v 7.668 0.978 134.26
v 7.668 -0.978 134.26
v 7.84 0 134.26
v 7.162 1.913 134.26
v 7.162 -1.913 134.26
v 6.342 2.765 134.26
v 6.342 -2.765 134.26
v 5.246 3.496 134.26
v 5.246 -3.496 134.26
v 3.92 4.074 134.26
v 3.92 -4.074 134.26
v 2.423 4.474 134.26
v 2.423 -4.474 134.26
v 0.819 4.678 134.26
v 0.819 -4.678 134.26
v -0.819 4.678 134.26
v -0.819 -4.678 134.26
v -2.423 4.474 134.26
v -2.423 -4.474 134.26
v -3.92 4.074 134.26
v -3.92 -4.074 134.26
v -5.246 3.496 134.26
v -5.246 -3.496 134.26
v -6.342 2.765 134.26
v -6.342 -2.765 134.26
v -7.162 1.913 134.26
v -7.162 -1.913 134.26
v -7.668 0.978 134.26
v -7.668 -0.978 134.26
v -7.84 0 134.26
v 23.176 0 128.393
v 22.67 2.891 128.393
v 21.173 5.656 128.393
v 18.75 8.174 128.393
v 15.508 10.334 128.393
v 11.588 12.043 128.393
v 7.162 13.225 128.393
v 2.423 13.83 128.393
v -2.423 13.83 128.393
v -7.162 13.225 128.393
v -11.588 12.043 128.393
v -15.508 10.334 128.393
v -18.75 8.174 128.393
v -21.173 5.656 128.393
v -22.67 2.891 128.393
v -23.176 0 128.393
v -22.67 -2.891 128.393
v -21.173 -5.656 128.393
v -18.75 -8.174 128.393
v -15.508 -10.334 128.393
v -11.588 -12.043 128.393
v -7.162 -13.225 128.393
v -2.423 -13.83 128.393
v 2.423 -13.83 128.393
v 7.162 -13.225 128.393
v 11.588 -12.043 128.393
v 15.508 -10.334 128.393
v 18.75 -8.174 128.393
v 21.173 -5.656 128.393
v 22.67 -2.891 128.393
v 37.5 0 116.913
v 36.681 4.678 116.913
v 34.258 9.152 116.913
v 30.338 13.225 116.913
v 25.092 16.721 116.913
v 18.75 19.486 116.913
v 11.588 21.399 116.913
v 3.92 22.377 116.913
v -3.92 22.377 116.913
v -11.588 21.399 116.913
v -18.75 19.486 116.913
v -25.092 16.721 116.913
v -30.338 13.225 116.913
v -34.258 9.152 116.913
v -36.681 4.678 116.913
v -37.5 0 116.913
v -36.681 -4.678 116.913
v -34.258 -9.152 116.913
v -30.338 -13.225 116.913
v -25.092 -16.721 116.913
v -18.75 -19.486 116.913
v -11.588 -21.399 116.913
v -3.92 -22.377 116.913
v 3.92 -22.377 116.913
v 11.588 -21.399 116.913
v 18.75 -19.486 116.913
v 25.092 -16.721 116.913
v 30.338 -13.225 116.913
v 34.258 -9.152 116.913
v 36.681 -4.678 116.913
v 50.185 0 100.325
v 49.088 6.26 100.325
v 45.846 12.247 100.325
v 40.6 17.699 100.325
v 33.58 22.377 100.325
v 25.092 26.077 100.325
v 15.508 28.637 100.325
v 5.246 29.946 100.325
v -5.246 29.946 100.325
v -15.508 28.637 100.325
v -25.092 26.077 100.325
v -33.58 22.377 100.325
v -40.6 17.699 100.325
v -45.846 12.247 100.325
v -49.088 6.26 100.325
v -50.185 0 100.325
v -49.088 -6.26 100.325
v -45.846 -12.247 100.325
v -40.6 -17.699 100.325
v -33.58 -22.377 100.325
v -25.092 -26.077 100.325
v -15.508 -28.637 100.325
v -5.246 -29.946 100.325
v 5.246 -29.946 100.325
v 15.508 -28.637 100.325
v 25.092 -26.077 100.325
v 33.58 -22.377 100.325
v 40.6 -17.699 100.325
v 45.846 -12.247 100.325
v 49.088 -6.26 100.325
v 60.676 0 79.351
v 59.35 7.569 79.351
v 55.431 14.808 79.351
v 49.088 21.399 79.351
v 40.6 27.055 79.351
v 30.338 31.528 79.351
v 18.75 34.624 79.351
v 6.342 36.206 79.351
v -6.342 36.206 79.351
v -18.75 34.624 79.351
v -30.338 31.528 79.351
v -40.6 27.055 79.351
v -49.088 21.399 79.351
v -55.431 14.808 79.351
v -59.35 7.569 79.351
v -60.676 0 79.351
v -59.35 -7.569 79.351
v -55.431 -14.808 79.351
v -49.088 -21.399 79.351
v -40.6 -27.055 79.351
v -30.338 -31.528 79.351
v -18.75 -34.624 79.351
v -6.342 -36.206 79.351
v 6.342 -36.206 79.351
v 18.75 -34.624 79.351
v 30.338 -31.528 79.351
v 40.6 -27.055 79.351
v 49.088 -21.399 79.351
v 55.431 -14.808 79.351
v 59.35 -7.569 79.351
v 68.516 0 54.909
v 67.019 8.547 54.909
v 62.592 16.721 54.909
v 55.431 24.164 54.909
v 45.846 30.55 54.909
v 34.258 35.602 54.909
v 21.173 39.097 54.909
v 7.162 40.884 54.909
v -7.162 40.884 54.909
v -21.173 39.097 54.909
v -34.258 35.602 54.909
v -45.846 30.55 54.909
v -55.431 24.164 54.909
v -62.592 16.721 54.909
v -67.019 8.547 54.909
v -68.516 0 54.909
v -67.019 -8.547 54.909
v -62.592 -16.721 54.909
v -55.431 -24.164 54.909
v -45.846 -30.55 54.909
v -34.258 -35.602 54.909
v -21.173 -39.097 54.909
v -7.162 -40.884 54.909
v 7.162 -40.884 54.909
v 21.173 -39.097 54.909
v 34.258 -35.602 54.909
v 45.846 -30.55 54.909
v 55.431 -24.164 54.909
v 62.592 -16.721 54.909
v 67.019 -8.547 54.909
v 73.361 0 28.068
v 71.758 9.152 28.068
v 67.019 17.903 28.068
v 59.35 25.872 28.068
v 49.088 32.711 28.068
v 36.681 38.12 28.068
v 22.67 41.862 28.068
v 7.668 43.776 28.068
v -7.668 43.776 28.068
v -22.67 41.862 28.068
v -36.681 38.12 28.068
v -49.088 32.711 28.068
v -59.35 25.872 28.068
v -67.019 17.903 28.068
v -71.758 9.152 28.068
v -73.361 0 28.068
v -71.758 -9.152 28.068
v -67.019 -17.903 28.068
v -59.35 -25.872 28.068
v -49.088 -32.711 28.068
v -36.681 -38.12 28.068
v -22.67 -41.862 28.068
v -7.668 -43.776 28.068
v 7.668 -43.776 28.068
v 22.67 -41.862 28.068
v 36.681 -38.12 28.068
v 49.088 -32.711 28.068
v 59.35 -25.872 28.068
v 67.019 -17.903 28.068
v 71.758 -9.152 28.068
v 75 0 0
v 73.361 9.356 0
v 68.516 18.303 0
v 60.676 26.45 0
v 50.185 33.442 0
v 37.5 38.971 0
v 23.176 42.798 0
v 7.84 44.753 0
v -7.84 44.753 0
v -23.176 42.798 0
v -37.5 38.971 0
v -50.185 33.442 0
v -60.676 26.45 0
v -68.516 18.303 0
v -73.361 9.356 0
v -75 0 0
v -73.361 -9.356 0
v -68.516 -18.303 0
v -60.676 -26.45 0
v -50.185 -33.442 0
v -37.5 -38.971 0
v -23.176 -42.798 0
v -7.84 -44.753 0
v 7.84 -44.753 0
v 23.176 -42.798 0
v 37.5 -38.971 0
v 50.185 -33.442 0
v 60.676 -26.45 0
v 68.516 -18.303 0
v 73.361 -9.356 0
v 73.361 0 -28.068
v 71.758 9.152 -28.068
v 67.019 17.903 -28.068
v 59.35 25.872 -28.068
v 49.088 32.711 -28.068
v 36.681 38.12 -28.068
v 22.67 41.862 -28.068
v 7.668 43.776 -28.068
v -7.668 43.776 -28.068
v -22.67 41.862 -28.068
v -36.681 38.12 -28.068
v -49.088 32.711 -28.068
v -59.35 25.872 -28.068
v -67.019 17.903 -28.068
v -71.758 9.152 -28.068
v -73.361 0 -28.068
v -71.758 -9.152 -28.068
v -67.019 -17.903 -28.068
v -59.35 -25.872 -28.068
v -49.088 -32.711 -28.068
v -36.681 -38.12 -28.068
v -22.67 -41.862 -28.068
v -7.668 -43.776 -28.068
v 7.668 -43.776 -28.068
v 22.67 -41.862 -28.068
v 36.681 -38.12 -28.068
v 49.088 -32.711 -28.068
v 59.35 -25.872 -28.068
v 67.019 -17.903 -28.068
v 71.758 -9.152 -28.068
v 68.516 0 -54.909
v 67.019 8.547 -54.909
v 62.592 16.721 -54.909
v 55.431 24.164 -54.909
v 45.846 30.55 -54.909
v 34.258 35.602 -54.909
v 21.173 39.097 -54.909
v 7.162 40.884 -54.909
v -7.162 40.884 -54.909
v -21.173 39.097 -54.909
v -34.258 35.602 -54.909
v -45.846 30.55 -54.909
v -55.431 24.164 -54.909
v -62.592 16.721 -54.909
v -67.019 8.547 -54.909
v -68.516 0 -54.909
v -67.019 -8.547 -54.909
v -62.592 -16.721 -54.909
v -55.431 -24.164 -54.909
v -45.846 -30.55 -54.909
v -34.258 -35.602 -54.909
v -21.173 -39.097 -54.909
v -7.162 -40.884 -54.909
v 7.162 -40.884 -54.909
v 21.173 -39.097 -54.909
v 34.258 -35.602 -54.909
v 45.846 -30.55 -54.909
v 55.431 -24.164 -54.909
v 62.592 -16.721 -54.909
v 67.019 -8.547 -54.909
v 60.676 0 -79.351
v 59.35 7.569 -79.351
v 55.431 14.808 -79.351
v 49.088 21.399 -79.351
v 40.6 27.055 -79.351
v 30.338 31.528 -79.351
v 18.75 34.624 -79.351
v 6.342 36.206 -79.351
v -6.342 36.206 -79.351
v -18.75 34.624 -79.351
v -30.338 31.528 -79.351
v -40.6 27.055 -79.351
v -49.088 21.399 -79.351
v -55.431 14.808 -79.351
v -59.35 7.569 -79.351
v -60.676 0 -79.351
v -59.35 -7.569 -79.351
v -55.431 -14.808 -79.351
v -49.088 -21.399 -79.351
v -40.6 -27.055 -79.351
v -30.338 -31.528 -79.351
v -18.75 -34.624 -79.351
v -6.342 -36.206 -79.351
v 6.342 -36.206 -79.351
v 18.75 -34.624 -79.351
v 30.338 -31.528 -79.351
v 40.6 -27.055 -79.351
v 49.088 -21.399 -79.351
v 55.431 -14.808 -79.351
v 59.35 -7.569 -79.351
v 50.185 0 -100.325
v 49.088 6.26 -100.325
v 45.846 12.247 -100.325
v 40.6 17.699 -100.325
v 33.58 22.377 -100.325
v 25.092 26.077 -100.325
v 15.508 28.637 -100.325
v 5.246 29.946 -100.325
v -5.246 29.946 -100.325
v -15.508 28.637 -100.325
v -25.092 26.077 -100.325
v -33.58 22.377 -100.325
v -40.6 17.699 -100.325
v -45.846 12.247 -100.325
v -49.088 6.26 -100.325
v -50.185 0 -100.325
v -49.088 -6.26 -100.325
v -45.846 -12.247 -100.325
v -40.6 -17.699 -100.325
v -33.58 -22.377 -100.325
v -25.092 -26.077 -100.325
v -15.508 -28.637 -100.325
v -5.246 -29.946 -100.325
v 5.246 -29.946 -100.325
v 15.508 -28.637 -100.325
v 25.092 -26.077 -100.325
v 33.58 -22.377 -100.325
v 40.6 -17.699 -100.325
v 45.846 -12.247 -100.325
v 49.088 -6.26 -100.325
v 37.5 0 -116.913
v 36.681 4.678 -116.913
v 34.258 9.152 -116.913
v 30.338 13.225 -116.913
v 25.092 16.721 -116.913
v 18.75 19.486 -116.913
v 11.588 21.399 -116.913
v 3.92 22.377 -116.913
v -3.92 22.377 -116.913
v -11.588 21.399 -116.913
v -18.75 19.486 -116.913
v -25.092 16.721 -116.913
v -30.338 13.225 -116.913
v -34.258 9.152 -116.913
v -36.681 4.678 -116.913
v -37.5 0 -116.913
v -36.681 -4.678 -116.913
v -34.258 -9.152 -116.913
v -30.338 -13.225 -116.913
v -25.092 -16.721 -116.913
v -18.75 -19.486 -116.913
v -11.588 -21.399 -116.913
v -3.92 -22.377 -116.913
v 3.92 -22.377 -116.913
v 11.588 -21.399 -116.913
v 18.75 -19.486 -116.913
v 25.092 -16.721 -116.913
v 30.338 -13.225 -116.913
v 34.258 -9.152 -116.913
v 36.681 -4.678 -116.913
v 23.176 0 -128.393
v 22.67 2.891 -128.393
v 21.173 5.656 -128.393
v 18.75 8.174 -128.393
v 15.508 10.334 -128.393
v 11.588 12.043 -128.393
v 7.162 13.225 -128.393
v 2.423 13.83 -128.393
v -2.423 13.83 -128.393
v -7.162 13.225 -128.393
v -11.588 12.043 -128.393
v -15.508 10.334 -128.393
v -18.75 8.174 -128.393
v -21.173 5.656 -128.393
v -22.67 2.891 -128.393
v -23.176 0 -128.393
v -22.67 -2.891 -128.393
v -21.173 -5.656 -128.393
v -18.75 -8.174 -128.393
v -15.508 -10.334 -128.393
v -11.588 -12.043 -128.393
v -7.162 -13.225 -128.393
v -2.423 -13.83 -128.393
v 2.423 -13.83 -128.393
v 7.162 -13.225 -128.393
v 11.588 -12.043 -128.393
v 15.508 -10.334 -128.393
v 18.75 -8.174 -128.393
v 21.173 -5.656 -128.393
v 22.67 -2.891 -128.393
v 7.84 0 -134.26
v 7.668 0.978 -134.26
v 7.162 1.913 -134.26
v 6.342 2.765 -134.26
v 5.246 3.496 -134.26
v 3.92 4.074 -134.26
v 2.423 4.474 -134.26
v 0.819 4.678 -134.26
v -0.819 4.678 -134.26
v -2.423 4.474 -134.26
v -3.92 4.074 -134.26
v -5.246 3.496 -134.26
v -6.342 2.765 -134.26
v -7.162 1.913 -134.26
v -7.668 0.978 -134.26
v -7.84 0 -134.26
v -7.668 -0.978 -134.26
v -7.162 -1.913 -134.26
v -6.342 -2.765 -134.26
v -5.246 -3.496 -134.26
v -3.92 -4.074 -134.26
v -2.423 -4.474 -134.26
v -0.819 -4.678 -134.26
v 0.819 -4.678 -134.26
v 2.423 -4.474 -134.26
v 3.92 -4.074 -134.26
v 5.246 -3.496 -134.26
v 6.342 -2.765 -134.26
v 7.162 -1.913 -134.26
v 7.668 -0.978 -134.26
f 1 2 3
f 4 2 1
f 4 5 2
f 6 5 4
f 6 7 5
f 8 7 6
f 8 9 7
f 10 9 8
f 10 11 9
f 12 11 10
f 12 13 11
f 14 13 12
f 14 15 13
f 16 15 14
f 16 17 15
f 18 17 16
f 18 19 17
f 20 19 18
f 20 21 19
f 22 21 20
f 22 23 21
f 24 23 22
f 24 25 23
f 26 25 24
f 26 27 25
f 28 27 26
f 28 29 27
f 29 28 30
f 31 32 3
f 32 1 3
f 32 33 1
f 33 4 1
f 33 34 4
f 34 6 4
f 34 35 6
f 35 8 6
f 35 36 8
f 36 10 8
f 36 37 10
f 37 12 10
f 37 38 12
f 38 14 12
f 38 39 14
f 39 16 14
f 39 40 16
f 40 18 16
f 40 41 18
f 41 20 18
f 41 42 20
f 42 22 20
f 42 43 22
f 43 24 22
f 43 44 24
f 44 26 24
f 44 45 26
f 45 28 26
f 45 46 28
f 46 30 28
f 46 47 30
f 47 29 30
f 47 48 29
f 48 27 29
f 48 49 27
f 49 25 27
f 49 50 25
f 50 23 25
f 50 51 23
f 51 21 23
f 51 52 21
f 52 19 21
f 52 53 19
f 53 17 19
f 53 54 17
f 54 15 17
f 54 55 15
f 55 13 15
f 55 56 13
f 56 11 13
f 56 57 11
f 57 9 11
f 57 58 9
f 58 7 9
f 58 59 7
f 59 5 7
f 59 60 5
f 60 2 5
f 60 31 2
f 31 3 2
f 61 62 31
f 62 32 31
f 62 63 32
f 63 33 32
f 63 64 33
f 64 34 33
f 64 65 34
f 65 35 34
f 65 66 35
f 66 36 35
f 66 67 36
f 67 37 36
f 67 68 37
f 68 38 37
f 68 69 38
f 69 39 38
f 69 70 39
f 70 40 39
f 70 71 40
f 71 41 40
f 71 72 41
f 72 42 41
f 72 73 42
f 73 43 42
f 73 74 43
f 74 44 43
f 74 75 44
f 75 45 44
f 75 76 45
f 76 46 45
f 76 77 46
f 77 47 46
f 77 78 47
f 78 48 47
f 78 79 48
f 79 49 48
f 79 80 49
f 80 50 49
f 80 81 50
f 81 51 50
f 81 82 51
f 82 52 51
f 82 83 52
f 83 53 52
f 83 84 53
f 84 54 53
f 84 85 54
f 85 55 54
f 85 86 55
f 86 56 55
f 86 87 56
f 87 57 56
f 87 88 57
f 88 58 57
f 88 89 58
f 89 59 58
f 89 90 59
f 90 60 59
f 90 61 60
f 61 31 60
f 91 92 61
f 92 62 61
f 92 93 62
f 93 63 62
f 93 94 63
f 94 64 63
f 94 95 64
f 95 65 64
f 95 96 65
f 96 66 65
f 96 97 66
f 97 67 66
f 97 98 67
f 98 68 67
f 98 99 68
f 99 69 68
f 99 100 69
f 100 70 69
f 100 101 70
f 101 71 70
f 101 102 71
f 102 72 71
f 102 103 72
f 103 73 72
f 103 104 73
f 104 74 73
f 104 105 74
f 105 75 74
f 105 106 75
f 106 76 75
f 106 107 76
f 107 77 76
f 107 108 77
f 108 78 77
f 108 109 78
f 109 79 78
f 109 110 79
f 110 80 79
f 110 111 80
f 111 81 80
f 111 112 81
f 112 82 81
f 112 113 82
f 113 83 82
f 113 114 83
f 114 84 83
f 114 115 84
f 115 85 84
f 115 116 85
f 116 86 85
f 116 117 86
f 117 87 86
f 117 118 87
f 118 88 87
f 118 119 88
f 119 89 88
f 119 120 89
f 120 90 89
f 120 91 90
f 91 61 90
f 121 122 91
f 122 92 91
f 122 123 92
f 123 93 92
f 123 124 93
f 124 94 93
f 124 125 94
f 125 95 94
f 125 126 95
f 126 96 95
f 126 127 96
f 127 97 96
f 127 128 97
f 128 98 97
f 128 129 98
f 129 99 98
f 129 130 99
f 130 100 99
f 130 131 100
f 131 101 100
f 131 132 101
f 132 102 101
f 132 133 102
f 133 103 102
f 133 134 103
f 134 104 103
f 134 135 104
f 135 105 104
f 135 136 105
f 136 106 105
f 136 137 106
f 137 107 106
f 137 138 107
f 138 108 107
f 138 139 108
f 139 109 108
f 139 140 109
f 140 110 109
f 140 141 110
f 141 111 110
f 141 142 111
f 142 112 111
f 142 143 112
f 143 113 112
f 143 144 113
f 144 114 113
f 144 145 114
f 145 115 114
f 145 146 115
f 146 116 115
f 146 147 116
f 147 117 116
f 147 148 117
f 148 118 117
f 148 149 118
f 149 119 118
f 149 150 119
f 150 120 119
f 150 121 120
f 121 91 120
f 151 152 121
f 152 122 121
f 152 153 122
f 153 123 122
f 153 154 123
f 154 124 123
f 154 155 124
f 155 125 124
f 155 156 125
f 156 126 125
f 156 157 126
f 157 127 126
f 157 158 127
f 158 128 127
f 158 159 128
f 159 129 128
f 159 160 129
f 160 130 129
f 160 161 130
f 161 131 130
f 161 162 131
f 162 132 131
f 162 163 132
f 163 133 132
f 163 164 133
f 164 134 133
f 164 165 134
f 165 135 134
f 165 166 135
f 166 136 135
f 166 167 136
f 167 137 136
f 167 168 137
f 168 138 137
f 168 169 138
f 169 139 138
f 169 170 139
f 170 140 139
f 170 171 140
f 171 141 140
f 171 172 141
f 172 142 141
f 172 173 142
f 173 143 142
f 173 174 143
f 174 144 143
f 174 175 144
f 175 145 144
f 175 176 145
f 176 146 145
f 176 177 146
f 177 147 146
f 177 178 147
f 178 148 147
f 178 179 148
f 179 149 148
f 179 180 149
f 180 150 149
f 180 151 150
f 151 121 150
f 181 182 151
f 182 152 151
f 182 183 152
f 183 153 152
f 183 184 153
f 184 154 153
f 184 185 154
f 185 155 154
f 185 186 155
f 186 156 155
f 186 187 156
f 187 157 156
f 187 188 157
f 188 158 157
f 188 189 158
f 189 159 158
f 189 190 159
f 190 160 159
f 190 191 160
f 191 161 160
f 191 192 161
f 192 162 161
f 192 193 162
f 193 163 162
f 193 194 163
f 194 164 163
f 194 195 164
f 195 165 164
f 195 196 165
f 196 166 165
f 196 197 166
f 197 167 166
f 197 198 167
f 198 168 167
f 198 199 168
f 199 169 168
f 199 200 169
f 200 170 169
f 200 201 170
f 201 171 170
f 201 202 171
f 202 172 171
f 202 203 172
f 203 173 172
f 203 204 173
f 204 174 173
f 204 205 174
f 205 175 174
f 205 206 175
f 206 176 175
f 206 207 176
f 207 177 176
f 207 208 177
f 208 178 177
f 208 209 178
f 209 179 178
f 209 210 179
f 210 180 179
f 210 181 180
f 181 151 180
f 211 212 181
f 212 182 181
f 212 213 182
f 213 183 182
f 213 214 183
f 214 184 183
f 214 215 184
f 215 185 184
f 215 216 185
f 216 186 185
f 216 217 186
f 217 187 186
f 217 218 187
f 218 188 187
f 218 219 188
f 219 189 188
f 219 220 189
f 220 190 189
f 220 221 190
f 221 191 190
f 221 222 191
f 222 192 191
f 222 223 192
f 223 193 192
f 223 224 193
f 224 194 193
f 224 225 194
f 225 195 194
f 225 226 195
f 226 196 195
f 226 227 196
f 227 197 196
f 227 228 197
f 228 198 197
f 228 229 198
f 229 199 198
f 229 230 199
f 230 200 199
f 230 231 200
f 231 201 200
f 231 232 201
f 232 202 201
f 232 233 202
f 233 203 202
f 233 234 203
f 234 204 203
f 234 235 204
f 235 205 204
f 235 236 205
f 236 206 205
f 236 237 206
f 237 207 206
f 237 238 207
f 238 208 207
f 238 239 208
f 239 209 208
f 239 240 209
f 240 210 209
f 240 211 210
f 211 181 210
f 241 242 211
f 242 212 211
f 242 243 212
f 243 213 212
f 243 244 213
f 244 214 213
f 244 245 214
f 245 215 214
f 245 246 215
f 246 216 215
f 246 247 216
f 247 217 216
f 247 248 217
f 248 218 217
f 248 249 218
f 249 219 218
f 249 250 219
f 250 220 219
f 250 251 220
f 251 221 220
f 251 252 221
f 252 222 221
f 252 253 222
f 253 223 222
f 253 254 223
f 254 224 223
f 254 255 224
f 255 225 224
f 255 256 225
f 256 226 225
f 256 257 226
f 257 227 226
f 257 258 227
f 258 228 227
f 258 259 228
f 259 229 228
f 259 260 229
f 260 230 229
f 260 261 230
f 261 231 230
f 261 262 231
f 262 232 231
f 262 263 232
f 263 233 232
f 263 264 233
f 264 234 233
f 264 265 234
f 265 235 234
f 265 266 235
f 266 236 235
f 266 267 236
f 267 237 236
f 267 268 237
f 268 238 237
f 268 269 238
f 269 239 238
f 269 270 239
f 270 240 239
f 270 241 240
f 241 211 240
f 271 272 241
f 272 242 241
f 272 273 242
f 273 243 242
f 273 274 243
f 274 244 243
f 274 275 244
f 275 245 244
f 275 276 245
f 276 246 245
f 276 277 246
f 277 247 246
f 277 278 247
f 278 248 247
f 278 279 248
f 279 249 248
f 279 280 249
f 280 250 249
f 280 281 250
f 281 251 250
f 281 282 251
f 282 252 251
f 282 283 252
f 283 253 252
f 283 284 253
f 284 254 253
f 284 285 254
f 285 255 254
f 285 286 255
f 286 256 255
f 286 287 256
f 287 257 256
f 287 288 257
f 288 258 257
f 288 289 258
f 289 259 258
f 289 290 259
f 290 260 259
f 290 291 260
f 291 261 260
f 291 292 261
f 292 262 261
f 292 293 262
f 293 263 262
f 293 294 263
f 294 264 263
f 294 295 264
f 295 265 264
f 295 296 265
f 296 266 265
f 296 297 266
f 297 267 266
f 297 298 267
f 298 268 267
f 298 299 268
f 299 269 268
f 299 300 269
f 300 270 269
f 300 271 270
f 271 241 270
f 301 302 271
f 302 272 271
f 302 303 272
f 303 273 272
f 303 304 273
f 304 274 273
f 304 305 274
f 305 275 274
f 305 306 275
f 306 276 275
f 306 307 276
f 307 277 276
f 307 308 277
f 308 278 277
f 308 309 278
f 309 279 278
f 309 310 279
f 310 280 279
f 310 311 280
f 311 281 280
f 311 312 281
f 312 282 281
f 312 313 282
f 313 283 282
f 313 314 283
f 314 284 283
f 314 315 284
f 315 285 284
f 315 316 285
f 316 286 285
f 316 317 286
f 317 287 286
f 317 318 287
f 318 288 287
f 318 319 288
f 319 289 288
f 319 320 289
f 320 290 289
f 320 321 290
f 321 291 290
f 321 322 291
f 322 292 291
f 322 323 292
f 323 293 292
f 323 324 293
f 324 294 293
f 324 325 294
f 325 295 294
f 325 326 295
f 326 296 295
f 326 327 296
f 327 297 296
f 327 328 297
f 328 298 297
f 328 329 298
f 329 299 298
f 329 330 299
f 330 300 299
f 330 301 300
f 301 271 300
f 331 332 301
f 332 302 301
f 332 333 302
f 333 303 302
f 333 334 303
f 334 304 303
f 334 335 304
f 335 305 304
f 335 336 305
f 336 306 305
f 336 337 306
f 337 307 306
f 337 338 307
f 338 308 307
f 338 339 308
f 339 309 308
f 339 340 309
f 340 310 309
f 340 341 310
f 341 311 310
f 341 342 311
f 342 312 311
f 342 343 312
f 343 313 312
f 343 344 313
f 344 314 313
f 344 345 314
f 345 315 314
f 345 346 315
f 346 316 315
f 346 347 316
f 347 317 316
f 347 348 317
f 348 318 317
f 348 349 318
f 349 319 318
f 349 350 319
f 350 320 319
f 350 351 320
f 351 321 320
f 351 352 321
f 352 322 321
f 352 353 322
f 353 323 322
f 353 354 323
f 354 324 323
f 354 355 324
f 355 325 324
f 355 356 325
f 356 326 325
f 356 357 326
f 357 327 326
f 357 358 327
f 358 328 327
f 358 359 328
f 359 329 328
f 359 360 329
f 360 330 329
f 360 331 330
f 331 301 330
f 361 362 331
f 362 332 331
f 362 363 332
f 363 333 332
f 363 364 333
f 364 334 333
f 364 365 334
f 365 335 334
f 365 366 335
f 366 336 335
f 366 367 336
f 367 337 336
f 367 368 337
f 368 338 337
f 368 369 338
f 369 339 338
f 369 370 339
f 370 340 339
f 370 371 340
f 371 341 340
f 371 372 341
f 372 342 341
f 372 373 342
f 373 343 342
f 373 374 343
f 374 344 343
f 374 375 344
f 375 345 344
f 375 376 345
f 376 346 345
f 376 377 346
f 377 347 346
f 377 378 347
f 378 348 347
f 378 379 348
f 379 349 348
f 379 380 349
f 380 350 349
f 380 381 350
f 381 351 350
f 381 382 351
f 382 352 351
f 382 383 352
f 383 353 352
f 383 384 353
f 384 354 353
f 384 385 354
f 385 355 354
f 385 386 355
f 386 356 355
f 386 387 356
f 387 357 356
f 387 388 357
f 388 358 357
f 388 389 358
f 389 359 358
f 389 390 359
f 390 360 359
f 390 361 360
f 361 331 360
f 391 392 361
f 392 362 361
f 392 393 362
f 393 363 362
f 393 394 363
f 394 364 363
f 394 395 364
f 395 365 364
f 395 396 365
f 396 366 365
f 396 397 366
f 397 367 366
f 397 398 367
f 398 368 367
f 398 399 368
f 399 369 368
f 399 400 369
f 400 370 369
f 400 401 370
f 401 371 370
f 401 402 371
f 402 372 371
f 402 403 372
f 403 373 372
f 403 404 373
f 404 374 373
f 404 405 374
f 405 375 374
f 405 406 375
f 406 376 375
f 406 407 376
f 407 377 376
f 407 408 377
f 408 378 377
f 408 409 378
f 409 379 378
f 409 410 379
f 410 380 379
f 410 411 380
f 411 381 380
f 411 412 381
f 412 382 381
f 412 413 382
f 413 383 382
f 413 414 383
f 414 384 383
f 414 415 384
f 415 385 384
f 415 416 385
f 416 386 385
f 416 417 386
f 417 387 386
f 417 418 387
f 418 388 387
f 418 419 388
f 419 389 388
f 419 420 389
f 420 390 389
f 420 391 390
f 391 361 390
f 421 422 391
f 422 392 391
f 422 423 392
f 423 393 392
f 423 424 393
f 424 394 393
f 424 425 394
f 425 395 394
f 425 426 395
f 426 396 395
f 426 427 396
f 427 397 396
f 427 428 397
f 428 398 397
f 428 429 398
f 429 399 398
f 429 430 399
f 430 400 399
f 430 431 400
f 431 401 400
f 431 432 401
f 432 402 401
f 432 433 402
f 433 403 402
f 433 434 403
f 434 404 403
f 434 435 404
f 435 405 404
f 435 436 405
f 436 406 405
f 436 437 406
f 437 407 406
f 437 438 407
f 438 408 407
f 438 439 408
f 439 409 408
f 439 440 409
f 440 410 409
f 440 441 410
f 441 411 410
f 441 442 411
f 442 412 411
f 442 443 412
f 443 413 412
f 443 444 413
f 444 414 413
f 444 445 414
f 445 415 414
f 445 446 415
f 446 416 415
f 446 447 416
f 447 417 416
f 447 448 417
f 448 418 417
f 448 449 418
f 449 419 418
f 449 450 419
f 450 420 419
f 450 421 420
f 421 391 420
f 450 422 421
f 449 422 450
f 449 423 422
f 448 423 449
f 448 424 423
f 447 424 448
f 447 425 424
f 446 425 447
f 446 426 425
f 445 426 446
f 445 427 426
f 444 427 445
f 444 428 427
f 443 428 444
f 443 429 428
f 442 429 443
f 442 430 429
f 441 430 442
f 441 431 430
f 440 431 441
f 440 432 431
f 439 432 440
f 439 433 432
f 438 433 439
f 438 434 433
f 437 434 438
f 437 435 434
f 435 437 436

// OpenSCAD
// Generated by SolidPython 1.0.1 on 2020-07-29 00:46:46


scale(v = [5, 3, 9]) {
	sphere(r = 15);
}
/***********************************************
*********      SolidPython code:      **********
************************************************
 
# import packages: SolidPython
from solid import *
from solid.utils import *
from itertools import chain, combinations, permutations


class Resize:

    def __init__(self, scad_file):
        self.scad_file = scad_file
        #self.scad_file = import_scad(scad_file)
        # cone/cylinder param:
        self.r1 = 0
        self.r2 = 0
        self.h = 0
        # rectangular prism param:
        self.w = 0
        self.l = 0
        # ellipse param:
        self.r = 0

    # import OpenScad code (file name corresponds to shape)


    # classify shape + parameters
    def assign(self, param1, param2, param3):
        if self.scad_file == 'cone.scad':
            self.r1 = param1
            self.r2 = param2
            self.h = param3
        elif self.scad_file == 'cylinder.scad':
            self.r1 = param1
            self.r2 = param2
            self.h = param3
        elif self.scad_file == 'rectangularPrism.scad':
            self.h = param1
            self.l = param2
            self.w = param3
        else:
            self.r = param1
            self.h = param2

    # resize parameters
    def iterate(self):
        x = range(3, 20, 2)
        i = 1
        if self.scad_file == 'cone.scad':
            tempList = list(permutations(x, 2))
            for temp in tempList:
                param1 = temp[0]
                param2 = temp[1]
                filepath = 'produced_scad_files/' + 'cone' + str(param1) + '_' + str(param2) + '_' + '.scad'
                scad_render_to_file(cylinder(h=param1, r1=param2, r2=0), filepath)

        elif self.scad_file == 'cylinder.scad':
            tempList = list(permutations(x, 3))
            for temp in tempList:
                param1 = temp[0]
                param2 = temp[1]
                filepath = 'produced_scad_files/' + 'cylinder' + str(param1) + '_' + str(param2) + '_' + '.scad'
                scad_render_to_file(cylinder(h=param1, r1=param2, r2=param2), filepath)

        elif self.scad_file == 'rectangularPrism.scad':
            tempList = list(permutations(x, 3))
            for temp in tempList:
                param1 = temp[0]
                param2 = temp[1]
                param3 = temp[2]
                filepath = 'produced_scad_files/' + 'rectangularPrism' + str(param1) + '_' + str(param2) + '_' + str(
                    param3) + '.scad'
                scad_render_to_file(cube(size=(param1, param2, param3)), filepath)

        elif self.scad_file == 'ellipse.scad':
            tempList = list(permutations(x, 4))
            for temp in tempList:
                param1 = temp[0]
                param2 = temp[1]
                param3 = temp[2]
                param4 = temp[3]
                filepath = 'produced_scad_files/' + 'ellipse' + str(param1) + '_' + str(param2) + '_' + str(param3) + '_' + str(param4) + '.scad'
                scad_render_to_file(scale([param1, param2, param3])(sphere(r=param4)), filepath)

    def render_to_scadfile(self):
        scad_render_to_file(scad, 'example.scad') 
 
************************************************/
